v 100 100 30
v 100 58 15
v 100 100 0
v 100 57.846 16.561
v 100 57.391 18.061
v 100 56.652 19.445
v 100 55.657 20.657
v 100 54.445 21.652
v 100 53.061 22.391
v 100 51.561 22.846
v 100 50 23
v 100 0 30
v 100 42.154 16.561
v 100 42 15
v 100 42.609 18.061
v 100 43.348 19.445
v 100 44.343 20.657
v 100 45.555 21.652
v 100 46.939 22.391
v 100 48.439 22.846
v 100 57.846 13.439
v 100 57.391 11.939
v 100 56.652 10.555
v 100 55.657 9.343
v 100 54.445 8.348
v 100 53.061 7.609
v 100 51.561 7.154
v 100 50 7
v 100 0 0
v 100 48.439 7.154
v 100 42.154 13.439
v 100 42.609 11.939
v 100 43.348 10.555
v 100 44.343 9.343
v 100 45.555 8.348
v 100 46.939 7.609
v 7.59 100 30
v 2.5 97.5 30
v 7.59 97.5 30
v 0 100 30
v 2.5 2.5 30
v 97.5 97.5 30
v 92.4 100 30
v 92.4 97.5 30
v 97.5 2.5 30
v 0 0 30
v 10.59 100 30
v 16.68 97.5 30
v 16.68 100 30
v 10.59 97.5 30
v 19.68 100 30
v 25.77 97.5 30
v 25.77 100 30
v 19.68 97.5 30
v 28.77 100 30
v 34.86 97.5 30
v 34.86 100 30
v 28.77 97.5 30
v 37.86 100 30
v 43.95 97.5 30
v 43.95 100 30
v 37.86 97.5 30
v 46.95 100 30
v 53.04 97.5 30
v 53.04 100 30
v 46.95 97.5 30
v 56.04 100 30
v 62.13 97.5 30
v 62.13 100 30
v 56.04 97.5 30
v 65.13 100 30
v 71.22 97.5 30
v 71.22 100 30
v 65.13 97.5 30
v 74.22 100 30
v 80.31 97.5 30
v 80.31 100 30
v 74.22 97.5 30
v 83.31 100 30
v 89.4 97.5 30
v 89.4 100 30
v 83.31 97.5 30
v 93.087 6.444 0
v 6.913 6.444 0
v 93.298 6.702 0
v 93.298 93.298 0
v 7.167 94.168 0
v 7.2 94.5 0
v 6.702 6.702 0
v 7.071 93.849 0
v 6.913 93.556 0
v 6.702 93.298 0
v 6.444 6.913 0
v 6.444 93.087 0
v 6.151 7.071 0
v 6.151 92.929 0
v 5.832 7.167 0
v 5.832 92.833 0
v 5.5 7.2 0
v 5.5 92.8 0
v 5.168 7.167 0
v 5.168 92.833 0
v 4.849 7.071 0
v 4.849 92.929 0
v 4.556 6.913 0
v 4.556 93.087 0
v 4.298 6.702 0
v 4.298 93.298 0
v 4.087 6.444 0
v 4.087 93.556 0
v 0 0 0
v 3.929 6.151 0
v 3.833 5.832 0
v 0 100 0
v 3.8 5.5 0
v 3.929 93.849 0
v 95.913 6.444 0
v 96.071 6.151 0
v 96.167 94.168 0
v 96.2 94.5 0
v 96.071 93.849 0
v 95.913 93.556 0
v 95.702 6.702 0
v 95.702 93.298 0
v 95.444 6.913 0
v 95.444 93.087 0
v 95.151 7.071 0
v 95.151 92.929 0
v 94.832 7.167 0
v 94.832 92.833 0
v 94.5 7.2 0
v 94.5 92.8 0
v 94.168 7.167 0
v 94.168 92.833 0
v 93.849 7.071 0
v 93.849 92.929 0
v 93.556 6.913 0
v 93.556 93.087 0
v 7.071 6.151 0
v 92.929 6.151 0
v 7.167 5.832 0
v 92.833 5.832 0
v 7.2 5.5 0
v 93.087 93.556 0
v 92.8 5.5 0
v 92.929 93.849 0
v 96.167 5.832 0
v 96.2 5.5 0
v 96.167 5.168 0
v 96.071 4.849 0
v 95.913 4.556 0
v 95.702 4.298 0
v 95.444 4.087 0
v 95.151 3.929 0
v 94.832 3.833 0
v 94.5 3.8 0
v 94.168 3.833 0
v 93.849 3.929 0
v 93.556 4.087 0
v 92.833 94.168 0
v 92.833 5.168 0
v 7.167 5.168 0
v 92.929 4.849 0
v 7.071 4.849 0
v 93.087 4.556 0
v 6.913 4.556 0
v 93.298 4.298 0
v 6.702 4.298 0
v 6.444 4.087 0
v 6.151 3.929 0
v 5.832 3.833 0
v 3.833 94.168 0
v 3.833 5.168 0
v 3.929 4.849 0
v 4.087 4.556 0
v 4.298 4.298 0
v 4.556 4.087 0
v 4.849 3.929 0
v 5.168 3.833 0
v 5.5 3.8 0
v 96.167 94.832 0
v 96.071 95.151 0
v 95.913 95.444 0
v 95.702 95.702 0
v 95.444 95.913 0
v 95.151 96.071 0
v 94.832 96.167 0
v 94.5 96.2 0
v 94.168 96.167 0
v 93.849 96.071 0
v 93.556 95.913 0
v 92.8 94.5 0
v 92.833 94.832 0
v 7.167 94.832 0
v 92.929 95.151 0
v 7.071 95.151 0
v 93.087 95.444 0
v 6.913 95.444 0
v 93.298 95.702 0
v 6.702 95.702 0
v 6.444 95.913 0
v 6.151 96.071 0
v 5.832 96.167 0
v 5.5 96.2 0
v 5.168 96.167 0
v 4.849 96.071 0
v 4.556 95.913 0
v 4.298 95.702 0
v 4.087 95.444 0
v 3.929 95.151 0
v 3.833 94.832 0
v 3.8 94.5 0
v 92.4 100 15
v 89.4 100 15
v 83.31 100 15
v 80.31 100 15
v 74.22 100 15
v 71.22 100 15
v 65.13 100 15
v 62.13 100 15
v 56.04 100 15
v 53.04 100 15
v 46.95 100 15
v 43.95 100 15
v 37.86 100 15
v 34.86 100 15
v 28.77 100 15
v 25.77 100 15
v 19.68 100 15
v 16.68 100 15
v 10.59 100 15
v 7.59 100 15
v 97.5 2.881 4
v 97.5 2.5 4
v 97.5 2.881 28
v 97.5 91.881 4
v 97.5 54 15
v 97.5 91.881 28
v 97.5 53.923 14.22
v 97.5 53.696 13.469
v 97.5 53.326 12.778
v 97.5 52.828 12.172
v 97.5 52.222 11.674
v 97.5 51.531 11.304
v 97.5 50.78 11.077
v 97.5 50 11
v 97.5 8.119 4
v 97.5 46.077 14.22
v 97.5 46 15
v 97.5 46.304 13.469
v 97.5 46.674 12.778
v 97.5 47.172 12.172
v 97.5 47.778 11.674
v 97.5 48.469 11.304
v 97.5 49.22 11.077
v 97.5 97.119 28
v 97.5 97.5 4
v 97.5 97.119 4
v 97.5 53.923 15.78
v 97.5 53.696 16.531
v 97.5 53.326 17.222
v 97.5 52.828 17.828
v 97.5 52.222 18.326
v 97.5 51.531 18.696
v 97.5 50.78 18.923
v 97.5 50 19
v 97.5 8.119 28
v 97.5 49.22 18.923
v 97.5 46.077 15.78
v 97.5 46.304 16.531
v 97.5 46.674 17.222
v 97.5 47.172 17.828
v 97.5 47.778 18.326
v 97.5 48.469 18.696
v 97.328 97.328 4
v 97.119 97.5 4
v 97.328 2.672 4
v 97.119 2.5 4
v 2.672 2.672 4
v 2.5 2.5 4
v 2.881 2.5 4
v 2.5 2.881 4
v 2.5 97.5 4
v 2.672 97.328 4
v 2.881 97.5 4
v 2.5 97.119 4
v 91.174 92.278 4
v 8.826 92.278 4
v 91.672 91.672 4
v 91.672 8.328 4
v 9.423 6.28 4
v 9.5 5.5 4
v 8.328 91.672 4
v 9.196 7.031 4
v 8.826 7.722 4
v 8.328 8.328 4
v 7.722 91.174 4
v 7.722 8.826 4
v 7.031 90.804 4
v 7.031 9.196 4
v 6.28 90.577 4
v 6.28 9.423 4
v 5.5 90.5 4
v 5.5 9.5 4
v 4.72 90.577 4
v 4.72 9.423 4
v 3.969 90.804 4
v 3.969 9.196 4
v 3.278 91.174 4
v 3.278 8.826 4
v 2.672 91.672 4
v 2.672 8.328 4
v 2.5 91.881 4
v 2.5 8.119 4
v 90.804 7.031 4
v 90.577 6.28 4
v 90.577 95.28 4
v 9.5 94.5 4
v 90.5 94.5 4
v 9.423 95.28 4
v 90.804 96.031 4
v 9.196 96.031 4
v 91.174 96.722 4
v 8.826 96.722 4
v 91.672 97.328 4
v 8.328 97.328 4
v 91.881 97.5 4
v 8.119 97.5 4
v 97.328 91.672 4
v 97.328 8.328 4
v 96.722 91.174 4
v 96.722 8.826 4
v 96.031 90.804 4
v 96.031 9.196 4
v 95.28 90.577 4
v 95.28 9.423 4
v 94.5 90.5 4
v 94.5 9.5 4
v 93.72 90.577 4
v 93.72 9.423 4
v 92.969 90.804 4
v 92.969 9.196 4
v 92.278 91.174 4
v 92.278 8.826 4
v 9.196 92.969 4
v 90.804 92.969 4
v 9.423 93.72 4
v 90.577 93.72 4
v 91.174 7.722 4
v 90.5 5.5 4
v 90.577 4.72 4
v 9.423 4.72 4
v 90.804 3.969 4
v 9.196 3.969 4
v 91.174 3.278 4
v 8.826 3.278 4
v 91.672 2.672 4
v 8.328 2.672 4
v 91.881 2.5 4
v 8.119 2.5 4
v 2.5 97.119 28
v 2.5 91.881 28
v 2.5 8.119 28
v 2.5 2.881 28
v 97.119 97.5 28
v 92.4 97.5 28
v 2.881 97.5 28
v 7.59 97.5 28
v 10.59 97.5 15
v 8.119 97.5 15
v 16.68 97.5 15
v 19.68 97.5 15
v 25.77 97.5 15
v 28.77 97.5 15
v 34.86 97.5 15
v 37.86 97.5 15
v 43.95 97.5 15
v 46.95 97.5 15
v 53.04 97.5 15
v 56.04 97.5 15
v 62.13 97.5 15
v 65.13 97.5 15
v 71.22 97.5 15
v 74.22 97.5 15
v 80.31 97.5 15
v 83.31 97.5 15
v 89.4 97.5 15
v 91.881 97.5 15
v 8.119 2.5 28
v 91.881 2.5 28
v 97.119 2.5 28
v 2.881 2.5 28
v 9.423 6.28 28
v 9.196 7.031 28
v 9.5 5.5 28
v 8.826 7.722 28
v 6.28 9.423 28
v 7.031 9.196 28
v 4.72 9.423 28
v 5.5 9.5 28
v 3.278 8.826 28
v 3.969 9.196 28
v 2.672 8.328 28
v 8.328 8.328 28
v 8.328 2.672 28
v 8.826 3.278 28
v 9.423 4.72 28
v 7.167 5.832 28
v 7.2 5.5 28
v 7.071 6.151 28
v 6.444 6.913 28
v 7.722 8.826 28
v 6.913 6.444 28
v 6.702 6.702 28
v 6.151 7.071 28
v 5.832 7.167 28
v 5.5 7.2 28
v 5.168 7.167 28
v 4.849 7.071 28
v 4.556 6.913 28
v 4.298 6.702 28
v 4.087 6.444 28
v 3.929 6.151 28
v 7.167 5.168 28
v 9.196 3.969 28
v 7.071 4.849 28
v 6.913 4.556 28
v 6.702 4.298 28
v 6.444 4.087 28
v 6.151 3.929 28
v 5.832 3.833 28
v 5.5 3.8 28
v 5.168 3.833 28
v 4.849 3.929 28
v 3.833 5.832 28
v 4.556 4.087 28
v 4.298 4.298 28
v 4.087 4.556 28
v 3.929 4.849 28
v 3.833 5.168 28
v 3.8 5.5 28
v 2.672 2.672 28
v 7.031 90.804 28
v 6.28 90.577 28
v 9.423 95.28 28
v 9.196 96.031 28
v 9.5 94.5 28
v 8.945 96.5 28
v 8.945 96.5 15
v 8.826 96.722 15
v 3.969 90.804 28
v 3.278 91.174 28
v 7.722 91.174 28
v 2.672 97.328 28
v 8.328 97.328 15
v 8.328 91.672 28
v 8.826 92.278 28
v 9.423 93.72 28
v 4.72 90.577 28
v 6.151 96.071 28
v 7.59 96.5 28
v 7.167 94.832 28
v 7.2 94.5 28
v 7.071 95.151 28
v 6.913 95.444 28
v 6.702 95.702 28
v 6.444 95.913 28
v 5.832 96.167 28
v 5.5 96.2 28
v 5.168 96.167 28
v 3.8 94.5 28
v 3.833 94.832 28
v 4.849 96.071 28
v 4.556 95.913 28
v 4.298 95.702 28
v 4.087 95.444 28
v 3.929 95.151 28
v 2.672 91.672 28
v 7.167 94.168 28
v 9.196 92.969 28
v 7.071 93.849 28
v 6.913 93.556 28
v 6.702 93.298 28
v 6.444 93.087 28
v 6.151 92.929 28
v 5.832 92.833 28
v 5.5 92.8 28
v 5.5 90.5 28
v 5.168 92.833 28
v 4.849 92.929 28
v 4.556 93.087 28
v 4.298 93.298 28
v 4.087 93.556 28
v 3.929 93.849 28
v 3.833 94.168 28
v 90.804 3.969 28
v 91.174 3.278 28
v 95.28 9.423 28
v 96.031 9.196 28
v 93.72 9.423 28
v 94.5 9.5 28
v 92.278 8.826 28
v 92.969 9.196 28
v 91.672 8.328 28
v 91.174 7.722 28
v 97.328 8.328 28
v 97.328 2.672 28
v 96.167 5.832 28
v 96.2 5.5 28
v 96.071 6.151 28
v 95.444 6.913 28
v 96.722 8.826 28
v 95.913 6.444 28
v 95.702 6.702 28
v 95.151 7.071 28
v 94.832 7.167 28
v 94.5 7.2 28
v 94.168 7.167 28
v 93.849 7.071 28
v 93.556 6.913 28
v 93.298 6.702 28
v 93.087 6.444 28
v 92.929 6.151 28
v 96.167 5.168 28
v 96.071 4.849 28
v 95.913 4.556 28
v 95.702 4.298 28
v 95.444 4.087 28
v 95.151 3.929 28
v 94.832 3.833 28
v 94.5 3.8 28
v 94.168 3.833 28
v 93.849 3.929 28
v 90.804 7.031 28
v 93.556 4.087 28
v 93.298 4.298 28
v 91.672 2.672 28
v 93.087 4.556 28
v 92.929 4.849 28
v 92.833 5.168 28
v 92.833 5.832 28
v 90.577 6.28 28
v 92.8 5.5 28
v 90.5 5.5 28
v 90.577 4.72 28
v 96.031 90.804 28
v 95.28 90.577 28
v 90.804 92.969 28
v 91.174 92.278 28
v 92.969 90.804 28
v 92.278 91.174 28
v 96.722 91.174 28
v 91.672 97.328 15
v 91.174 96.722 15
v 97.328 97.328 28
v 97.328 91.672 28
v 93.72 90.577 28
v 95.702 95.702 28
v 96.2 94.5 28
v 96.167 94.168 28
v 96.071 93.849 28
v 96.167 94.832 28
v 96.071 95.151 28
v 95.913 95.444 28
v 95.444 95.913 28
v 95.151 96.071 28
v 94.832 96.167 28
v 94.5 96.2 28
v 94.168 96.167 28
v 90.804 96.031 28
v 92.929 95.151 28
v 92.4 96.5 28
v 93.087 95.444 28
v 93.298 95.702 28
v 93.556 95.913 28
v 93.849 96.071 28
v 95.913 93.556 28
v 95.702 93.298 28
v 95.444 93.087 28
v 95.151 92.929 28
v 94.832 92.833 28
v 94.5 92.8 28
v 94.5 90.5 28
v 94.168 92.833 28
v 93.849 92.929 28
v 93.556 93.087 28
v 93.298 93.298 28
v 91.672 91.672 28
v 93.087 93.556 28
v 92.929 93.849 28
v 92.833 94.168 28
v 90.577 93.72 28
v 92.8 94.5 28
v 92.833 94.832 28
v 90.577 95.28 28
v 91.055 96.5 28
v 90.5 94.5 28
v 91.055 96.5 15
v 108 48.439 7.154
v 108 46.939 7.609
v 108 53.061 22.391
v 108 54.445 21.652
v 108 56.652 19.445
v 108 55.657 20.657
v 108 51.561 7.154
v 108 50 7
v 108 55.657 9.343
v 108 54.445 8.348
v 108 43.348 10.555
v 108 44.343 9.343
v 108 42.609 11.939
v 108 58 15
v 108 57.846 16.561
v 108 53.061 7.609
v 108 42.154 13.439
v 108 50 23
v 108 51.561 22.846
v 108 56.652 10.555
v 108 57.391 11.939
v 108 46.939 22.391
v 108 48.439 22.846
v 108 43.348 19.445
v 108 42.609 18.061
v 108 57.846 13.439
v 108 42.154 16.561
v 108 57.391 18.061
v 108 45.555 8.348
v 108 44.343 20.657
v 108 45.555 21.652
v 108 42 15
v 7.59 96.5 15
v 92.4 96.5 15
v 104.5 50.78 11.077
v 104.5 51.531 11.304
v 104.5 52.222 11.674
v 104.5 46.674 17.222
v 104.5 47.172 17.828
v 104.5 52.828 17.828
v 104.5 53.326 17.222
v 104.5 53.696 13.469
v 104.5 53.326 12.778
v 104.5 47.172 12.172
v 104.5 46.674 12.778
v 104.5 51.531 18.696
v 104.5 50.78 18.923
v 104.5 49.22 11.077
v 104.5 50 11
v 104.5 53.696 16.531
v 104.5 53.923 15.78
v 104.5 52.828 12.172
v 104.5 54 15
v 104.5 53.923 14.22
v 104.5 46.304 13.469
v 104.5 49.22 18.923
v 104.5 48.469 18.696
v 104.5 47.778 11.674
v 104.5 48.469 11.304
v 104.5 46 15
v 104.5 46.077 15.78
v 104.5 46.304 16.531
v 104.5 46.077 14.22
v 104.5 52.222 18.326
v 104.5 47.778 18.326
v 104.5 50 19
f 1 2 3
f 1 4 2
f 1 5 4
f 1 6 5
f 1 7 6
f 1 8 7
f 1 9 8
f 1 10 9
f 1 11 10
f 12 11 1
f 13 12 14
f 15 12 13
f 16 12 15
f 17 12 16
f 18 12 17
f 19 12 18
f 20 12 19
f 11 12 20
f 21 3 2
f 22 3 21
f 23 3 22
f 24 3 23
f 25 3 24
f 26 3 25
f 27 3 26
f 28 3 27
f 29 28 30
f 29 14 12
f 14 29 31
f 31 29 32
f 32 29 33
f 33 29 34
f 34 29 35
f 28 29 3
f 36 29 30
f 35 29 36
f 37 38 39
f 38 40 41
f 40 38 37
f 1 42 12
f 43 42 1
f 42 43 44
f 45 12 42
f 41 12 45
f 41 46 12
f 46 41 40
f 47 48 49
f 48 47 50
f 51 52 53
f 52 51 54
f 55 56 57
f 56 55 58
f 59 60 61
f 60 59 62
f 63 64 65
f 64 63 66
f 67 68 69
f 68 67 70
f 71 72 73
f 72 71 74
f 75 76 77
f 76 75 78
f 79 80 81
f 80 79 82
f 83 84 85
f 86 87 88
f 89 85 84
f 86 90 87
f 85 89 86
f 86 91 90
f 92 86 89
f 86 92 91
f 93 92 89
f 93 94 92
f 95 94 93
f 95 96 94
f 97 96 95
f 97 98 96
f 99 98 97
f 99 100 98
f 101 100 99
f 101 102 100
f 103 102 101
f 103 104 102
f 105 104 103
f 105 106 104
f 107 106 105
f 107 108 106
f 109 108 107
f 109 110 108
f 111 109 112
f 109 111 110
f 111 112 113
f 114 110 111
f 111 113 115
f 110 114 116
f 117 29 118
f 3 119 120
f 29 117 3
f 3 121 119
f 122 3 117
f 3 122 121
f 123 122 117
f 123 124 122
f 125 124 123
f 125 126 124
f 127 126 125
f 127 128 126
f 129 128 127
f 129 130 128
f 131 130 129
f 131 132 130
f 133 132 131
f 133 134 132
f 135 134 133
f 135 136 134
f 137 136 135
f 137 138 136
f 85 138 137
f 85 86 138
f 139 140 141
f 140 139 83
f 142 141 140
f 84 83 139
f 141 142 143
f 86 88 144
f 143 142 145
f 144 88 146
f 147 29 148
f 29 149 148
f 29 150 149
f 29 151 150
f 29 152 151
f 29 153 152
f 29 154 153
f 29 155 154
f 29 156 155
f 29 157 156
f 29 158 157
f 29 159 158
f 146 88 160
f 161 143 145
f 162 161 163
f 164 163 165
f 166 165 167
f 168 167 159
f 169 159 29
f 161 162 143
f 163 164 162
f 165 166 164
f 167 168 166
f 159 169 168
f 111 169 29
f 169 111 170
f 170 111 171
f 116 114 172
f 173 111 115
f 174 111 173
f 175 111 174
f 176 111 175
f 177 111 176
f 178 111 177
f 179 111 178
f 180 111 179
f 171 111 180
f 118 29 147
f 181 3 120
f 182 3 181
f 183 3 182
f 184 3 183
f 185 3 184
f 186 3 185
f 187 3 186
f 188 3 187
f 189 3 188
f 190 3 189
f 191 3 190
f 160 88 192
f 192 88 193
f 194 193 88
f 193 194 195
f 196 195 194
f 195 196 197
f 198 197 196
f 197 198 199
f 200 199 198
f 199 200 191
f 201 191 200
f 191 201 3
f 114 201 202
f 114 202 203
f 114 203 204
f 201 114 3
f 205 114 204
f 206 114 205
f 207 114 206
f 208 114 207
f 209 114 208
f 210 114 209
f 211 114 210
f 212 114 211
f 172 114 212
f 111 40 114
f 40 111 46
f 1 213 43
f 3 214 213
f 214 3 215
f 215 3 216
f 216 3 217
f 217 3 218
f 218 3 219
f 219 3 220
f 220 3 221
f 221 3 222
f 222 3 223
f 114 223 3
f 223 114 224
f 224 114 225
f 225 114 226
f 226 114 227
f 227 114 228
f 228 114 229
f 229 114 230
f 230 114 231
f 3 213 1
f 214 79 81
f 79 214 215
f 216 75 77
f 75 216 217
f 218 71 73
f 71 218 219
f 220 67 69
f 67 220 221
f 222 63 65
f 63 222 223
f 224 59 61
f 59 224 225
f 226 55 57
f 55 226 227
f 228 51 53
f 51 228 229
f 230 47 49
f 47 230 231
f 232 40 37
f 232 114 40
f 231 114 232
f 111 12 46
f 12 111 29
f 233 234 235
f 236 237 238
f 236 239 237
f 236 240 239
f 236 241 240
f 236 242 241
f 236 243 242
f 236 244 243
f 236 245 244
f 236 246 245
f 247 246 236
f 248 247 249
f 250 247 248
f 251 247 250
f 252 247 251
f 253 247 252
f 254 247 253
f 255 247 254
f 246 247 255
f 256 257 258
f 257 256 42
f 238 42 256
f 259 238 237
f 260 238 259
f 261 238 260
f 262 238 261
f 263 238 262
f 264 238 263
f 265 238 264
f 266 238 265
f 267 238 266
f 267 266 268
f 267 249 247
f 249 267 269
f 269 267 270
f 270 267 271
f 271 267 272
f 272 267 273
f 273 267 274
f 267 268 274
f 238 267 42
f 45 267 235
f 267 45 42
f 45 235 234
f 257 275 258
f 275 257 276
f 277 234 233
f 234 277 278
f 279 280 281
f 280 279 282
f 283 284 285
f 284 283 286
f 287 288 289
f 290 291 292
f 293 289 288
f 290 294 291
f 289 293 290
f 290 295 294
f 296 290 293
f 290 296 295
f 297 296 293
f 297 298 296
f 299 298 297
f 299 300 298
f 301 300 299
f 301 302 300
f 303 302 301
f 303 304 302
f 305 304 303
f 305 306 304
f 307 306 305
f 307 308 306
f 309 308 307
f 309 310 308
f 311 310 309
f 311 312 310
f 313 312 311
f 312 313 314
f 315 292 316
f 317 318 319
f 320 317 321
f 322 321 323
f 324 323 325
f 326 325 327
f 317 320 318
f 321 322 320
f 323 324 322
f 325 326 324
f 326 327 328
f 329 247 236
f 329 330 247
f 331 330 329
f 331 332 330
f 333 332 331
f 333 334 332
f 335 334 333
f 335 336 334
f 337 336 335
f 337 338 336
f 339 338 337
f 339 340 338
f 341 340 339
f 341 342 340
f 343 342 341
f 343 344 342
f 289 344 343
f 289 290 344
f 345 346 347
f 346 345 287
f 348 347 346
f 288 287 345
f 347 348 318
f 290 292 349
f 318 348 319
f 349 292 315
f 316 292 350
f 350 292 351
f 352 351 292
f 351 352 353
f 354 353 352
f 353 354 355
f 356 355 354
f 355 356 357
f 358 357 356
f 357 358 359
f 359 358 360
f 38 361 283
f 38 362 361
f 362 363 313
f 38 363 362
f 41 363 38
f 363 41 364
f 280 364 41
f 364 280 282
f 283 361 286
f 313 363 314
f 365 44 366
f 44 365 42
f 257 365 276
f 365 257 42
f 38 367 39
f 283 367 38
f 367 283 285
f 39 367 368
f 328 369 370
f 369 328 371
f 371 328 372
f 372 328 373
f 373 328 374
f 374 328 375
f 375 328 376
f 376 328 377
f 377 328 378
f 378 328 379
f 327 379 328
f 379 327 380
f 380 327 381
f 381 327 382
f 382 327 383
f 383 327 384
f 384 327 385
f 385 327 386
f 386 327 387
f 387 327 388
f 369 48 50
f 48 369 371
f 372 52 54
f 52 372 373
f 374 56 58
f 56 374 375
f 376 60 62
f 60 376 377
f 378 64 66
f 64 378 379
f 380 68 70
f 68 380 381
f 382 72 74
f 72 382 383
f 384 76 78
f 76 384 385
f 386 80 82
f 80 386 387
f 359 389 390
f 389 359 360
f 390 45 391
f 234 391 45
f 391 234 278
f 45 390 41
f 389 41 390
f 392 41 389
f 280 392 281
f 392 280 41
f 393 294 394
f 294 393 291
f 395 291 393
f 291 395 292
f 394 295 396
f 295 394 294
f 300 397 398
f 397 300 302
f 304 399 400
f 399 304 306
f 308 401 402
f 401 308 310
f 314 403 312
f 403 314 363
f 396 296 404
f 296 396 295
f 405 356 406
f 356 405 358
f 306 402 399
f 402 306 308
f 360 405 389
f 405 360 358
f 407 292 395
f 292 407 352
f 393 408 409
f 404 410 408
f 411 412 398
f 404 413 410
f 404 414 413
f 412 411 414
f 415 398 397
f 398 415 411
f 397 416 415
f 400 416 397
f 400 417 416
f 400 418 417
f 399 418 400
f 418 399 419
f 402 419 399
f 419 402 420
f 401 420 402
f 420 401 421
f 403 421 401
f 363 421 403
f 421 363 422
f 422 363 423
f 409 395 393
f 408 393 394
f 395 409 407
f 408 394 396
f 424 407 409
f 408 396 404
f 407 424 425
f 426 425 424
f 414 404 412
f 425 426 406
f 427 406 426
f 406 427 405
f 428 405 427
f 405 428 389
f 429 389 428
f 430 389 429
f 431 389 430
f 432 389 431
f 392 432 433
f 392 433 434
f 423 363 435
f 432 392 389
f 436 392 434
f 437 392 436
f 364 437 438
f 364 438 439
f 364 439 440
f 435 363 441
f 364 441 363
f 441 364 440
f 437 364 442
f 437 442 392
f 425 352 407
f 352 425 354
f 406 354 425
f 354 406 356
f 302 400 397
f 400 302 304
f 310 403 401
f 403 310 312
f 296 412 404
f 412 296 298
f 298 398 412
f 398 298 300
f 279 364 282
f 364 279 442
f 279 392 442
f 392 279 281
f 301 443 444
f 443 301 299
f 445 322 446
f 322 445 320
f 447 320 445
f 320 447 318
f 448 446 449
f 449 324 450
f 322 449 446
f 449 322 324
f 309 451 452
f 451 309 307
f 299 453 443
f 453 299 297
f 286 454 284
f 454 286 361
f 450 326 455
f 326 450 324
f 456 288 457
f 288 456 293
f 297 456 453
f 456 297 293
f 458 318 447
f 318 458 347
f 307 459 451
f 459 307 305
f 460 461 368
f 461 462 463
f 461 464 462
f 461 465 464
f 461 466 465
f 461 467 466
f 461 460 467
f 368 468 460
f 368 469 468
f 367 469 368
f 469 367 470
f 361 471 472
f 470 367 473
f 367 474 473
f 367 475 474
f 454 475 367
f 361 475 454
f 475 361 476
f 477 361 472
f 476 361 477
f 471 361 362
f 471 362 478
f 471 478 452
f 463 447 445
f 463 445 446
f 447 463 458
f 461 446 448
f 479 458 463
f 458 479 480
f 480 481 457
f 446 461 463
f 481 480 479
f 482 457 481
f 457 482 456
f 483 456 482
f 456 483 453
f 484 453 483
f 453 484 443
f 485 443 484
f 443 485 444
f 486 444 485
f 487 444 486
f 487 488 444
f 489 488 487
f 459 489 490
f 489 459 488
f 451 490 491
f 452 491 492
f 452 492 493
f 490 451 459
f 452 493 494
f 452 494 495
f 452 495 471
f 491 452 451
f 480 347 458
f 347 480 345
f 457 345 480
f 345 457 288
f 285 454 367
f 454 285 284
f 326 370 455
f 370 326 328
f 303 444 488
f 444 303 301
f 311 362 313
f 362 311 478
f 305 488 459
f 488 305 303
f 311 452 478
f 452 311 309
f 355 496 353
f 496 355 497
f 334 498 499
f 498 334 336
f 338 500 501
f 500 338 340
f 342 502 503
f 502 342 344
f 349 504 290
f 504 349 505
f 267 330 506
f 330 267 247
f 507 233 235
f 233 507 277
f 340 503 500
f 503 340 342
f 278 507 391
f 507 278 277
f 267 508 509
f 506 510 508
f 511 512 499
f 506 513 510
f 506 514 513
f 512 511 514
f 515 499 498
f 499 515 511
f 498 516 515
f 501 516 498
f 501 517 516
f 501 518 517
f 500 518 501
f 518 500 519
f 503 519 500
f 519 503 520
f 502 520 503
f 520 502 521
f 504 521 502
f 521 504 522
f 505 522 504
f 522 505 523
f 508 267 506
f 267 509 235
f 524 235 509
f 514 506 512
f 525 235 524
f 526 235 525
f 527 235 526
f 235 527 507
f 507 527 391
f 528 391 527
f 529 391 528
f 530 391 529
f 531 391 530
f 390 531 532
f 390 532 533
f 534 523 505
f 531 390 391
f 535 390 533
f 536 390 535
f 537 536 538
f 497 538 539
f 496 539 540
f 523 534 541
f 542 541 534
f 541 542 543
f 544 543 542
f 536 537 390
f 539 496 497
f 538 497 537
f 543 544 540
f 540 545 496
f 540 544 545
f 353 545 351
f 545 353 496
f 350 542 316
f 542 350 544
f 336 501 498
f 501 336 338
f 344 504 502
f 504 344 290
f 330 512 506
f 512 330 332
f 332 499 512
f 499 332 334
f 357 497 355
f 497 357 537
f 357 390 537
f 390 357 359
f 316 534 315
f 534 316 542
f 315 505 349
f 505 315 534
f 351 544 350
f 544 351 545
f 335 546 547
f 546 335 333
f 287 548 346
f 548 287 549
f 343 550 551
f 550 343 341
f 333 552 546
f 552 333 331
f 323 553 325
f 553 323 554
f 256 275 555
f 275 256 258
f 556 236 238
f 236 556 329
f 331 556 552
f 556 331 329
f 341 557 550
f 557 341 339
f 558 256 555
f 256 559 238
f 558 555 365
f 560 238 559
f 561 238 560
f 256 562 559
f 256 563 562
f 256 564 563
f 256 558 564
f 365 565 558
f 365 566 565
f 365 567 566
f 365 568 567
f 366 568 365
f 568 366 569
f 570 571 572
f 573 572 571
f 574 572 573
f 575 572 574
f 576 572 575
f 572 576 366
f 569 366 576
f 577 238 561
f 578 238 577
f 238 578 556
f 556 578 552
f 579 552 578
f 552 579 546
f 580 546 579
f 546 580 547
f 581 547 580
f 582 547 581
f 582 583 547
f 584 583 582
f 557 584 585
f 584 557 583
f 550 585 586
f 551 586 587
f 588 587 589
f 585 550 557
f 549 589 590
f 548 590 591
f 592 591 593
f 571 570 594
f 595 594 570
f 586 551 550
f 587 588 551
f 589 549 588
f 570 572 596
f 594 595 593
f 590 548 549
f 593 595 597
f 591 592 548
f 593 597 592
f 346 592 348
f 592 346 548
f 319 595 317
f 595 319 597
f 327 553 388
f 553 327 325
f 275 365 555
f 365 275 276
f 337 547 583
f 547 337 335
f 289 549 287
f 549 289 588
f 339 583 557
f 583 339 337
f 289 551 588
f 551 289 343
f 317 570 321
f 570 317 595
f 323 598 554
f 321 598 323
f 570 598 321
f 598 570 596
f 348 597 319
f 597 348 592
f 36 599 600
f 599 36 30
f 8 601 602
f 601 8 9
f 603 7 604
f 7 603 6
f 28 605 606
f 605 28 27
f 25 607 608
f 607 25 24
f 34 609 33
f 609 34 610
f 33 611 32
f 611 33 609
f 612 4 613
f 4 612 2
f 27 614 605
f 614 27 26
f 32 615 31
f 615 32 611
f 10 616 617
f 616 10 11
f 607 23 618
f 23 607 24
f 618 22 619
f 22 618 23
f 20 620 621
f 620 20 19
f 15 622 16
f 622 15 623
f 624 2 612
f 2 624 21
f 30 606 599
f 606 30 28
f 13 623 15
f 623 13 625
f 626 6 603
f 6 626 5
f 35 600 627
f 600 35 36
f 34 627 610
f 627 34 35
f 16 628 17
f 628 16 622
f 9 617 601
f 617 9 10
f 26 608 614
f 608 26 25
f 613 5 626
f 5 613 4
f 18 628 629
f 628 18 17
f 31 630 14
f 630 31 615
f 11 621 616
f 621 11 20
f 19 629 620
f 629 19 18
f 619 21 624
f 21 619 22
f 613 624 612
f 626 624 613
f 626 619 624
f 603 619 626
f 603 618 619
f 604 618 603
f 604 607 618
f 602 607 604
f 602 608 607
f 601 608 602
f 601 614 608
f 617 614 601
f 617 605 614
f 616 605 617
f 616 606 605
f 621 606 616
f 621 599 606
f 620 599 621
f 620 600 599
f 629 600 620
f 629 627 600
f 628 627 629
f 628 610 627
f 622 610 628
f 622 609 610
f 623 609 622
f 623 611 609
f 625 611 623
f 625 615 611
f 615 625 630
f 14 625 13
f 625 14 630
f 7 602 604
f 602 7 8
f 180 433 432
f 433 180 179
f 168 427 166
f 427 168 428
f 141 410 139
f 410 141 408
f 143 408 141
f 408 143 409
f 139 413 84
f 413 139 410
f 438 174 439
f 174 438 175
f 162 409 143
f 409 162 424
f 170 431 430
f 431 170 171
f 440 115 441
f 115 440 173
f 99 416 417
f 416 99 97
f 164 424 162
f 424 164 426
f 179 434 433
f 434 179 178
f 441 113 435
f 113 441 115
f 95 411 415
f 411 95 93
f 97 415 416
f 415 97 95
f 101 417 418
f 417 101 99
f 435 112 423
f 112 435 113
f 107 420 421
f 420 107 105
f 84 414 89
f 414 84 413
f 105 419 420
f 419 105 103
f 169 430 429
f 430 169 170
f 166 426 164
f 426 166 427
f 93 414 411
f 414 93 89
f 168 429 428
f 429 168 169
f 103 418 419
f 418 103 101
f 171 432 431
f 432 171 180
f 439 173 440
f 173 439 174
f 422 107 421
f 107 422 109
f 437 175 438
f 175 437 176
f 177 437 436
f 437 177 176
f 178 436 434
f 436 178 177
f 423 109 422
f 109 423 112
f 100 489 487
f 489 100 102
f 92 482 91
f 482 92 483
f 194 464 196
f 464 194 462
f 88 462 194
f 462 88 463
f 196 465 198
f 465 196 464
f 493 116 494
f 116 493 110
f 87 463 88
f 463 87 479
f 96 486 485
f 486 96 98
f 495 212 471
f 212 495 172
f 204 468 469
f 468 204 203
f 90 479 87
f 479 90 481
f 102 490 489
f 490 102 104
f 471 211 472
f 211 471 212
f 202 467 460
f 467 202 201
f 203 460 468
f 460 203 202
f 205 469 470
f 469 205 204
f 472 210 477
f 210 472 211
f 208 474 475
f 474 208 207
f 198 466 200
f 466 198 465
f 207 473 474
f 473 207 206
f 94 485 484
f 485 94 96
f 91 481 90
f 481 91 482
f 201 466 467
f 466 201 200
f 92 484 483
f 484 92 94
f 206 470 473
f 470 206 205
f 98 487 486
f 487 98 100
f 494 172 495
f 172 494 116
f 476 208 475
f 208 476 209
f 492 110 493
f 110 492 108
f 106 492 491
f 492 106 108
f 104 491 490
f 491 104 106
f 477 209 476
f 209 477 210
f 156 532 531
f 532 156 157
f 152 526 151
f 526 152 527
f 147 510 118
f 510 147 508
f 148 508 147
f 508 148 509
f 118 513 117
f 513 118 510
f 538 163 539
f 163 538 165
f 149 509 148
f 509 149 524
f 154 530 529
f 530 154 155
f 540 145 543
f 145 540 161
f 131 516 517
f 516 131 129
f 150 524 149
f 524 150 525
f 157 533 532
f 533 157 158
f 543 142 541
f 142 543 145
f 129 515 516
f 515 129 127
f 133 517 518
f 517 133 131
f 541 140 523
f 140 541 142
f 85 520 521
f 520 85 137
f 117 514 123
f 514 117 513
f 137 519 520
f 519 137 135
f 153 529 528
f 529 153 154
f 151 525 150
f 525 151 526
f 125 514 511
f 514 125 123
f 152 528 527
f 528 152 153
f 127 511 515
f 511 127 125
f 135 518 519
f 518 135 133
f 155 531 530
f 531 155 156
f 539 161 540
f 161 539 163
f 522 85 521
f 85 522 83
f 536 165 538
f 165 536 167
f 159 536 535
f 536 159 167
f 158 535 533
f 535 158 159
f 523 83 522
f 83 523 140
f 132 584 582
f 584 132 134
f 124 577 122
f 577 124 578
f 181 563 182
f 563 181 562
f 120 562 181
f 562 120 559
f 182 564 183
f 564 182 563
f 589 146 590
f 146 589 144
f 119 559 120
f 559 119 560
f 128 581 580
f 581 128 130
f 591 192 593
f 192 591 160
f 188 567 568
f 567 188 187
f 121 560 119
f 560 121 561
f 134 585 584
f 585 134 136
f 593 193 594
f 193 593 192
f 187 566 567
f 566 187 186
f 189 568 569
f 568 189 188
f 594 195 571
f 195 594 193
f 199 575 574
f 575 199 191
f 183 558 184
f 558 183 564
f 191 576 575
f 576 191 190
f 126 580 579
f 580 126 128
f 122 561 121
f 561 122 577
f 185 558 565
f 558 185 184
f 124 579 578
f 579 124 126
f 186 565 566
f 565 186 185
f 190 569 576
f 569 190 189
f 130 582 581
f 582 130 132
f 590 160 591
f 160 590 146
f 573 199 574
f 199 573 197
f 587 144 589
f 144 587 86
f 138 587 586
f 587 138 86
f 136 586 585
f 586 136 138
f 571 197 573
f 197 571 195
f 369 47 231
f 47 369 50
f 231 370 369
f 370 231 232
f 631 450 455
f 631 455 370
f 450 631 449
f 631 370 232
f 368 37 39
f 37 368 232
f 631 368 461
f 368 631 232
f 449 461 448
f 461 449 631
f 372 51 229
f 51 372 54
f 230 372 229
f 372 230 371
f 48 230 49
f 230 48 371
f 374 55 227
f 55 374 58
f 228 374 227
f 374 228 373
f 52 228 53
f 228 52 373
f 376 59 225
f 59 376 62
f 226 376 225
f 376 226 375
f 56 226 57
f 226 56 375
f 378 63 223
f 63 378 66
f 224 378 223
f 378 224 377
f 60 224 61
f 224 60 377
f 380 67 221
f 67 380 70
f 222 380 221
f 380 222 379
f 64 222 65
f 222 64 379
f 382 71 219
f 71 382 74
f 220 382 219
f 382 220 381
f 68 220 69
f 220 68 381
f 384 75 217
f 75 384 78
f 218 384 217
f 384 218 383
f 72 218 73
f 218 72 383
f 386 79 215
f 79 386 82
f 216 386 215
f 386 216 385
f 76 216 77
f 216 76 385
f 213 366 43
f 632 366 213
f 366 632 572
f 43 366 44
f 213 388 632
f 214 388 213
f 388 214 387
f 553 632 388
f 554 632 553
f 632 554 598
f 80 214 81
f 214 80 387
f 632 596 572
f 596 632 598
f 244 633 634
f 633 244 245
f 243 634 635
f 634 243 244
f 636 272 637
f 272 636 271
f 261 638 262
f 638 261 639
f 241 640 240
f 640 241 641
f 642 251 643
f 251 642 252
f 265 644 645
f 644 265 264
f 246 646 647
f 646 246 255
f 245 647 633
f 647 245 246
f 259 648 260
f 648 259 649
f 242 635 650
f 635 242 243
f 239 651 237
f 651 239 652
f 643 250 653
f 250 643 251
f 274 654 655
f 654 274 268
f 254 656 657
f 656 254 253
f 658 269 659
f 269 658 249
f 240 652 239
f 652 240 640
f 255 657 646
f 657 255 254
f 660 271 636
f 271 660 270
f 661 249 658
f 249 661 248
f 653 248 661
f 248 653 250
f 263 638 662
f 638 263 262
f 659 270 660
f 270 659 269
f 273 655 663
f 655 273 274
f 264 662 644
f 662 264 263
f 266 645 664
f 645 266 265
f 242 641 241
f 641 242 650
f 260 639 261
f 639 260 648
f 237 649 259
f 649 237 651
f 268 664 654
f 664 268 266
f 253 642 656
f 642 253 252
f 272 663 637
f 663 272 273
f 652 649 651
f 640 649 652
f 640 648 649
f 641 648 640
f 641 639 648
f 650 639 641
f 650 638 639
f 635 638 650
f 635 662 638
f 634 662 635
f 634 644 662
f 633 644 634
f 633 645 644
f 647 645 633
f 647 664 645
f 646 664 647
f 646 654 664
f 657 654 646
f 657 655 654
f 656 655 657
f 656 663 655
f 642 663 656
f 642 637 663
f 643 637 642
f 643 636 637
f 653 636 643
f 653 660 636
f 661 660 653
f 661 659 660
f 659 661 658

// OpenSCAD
$fn = 32;

// ----------------------------------------------------------------------
// Enclosure body: 100 x 100 x 30 mm, wall 2.5 mm
// ----------------------------------------------------------------------

// --- parameters (mm) ---
length = 100;             // outside length, X
width = 100;              // outside width, Y
height = 30;              // outside height, Z
wall = 2.5;               // side wall thickness
floor_t = 4;              // floor thickness
boss_d = 8;               // corner boss diameter
boss_h = 24;              // corner boss height above the floor
boss_hole_d = 3.4;        // lid screw clearance in the boss
boss_lip = 5.5;           // boss centre inset from the corner
vent_slots = 10;          // vent slots in the long wall
vent_w = 3;               // vent slot width
vent_h = 25;              // vent slot height
vent_pitch = 9.09;        // vent slot pitch
vent_z = 15;              // vent slot sill height
nipple_d = 16;            // cable gland boss diameter
nipple_h = 8;             // cable gland boss height
nipple_bore = 8;          // cable gland bore

module shell() {
  difference() {
    cube([length, width, height]);
    /* hollow, open at the top */
    translate([wall, wall, floor_t])
      cube([length - 2 * wall, width - 2 * wall, height]);
  }
}

module bosses() {
  /* corner bosses, sunk 1 mm into the floor */
  for (sx = [0, 1]) for (sy = [0, 1])
    translate([sx * (length - 2 * boss_lip) + boss_lip, sy * (width - 2 * boss_lip) + boss_lip, floor_t - 1])
      cylinder(h = boss_h + 1, d = boss_d);
}

module gland() {
  /* boss on the short wall, sunk 1 mm into it */
  translate([length - 1, width / 2, height * 0.5]) rotate([0, 90, 0])
    cylinder(h = nipple_h + 1, d = nipple_d);
}

difference() {
  union() {
    shell();
    bosses();
    gland();
  }
  /* boss screw holes */
  for (sx = [0, 1]) for (sy = [0, 1])
    translate([sx * (length - 2 * boss_lip) + boss_lip, sy * (width - 2 * boss_lip) + boss_lip, -1]) cylinder(h = floor_t + boss_h + 2, d = boss_hole_d);
  /* vent grille in the +Y wall */
  for (i = [0 : vent_slots - 1]) translate([vent_pitch * (i + 1) - vent_w / 2, width - wall - 1, vent_z]) cube([vent_w, wall + 2, vent_h]);
  translate([length, width / 2, height * 0.5]) rotate([0, 90, 0]) translate([0, 0, -nipple_h - 2]) cylinder(h = nipple_h + wall + 4, d = nipple_bore);
}
